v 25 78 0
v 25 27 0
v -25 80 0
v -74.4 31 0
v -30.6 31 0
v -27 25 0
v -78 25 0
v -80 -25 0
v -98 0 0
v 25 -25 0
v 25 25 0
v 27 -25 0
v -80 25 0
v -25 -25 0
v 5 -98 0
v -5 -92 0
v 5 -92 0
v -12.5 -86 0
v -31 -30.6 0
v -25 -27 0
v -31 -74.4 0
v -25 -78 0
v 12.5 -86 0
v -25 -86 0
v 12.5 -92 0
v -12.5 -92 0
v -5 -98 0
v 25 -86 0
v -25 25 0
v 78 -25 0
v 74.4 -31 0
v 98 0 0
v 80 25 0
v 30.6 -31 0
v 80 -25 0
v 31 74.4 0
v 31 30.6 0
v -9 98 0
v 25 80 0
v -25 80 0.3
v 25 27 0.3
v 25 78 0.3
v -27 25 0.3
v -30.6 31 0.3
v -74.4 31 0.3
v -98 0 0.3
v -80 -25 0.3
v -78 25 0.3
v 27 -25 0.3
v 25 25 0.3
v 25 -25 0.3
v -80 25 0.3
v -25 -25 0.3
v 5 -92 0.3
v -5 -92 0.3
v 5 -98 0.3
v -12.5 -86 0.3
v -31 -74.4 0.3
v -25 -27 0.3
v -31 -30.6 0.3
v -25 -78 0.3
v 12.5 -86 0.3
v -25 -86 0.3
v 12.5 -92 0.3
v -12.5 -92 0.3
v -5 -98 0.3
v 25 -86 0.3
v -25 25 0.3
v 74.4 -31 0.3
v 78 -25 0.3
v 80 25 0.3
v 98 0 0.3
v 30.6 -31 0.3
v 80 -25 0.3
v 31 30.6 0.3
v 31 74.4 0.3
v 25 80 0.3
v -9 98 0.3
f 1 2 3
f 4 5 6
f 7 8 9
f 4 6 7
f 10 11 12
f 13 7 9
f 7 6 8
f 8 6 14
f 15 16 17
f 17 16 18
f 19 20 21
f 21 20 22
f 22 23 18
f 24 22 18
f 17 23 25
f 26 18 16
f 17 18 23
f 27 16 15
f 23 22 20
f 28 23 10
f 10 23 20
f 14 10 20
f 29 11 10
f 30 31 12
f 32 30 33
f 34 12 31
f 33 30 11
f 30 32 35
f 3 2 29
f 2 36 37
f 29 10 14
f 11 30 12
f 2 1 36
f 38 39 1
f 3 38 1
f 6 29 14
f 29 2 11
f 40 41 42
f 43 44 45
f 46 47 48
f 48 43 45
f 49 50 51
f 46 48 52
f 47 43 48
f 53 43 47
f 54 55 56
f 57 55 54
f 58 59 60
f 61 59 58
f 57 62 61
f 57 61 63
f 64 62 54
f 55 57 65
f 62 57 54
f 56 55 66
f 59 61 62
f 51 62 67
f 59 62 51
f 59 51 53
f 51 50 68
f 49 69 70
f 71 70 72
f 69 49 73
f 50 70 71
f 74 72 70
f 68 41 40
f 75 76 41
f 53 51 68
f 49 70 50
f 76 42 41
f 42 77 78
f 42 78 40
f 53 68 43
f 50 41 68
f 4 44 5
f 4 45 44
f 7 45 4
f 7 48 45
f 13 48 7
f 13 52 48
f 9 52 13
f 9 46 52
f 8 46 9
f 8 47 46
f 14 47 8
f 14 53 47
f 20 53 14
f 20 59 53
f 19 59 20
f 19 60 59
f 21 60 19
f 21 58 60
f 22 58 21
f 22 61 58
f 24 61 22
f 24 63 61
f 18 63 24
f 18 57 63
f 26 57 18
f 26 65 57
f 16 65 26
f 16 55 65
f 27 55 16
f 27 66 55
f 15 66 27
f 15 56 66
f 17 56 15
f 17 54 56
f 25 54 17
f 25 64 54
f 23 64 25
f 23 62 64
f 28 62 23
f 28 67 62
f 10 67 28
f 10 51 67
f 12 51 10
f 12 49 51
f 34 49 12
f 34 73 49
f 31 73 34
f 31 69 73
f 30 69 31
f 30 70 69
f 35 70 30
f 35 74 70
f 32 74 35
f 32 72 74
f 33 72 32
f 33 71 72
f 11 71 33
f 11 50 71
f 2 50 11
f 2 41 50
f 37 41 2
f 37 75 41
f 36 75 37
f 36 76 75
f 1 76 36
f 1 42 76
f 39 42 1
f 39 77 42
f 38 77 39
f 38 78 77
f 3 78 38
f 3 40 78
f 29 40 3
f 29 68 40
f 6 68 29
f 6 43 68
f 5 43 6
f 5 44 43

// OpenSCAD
// Copyright (C) [Jonas Immanuel Frey] - Licensed under GPL

// One-piece paper lantern net. All dimensions are in millimetres.
// Roof shapes are upright silhouettes; the folded lantern is open on top.

// The walls are plain: windows and other decorations are SVG/DXF drawings the
// app (paper mode) places on them, see "App protocol" below.

/* [Output] */
output = "flat"; // [flat:Flat STL, cut:2D SVG or DXF, assembled:Folded preview, wall:Selected wall from outside, area:Decoration area]
// Guides appear only in the flat F5 preview, never in exported cutting geometry.
show_fold_guides = true;
paper_thickness = 0.3; // [0.1:0.05:1]

/* [House] */
// Square floor and width of each wall.
house_size = 50; // [30:1:90]
wall_height = 55; // [35:1:100]
roof_height = 18; // [0:1:40]
roof_style = "mixed"; // [mixed, gable, crooked, stepped, flat]

/* [Glue tabs] */
glue_tab_width = 6; // [3:0.5:12]
// Clearance at the floor and eaves so neighbouring folds do not bunch up.
tab_inset = 2; // [1:0.5:5]

/* [Hidden] */
// App protocol (vector2stl paper mode):
//   output = "cut"        the net as cut: the paper with every decoration cut out
//                         (inside face up, as it lies before folding)
//   output = "area"       where decorations may cut, laid out like the net; this
//                         output also echoes app_walls and app_folds
// app_walls[i] = [origin, x_axis, y_axis, [width, height]]: the point (x, y) of
//   wall i seen from outside lies on the net at origin + x * x_axis + y * y_axis.
// app_folds = [[[x0, y0], [x1, y1], angle], ...]: every fold line on the net and
//   how far it folds inward, in degrees. The app folds the cut net along these
//   lines for its 3D preview, starting from the piece under app_base.
// app_base = [x, y]: a point on the piece that stays put (the floor).
// Optional, with their defaults:
//   app_up = [0, 0, 1]: the direction on the app_base piece that points up
//     when folded; [0, 0, 1] stands a floor flat.
//   app_net_top = "inside": the face of the net facing up here becomes the
//     inside; "outside" for a net drawn outside face up (no mirroring needed).
//   app_fold_layer = true: the SVG gets a fold (score) layer; false when the cut
//     already perforates the folds.
// The app supplies normalized polygons, seen from outside:
//   app_decorations = [[wall, centre_x, centre_y, width, points, paths, rotation], ...]
decorations = is_undef(app_decorations) ? [] : app_decorations;
wall_index = 0;
minimum_border = 2;
tab_taper = glue_tab_width * 0.6;
guide_width = 0.25;
mixed_roofs = ["crooked", "gable", "stepped", "gable"];
flat_span = house_size + 2 * (wall_height + (roof_style == "flat" ? 0 : roof_height));

assert(output == "flat" || output == "cut" || output == "assembled" || output == "wall"
       || output == "area", "Choose flat, cut, assembled, wall or area output.");
assert(roof_style == "mixed" || roof_style == "gable" || roof_style == "crooked"
       || roof_style == "stepped" || roof_style == "flat", "Unknown roof style.");
assert(house_size > 0 && wall_height > 0 && roof_height >= 0 && paper_thickness > 0,
       "House size, wall height and thickness must be positive; roof height cannot be negative.");
assert(glue_tab_width > 0 && tab_inset > 0
       && wall_height > 2 * (tab_inset + tab_taper),
       "Tabs need positive width/inset and enough wall height for their tapered ends.");
assert(house_size > 2 * (glue_tab_width + minimum_border),
       "House walls need room for both corner glue areas and a cutout.");

echo(str("Floor: ", house_size, " x ", house_size,
         " mm; flat footprint: ", flat_span, " x ", flat_span, " mm."));

function wall_roof(index) = roof_style == "mixed" ? mixed_roofs[index] : roof_style;
function wall_top(index) =
    wall_roof(index) == "flat" || roof_height == 0 ? wall_height : wall_height + roof_height;

// Local wall coordinates: x = width, y = height above the floor fold.
module wall_outline_2d(style) {
    if (style == "flat" || roof_height == 0)
        square([house_size, wall_height]);
    else if (style == "stepped")
        polygon([
            [0, 0], [house_size, 0],
            [house_size, wall_height + roof_height / 3],
            [house_size * 0.75, wall_height + roof_height / 3],
            [house_size * 0.75, wall_height + roof_height * 2 / 3],
            [house_size * 0.6, wall_height + roof_height * 2 / 3],
            [house_size * 0.6, wall_height + roof_height],
            [house_size * 0.4, wall_height + roof_height],
            [house_size * 0.4, wall_height + roof_height * 2 / 3],
            [house_size * 0.25, wall_height + roof_height * 2 / 3],
            [house_size * 0.25, wall_height + roof_height / 3],
            [0, wall_height + roof_height / 3]
        ]);
    else
        polygon([
            [0, 0], [house_size, 0], [house_size, wall_height],
            [house_size * (style == "crooked" ? 0.32 : 0.5), wall_height + roof_height],
            [0, wall_height]
        ]);
}

// Where a wall may be cut: inside its perimeter border, clear of the floor fold
// and of the folded corner glue areas.
module decoration_area_2d(index) {
    intersection() {
        offset(delta = -minimum_border) wall_outline_2d(wall_roof(index));
        translate([glue_tab_width + minimum_border, minimum_border])
            square([house_size - 2 * (glue_tab_width + minimum_border),
                    wall_height + roof_height]);
    }
}

module wall_2d(index) {
    difference() {
        wall_outline_2d(wall_roof(index));
        intersection() {
            decoration_area_2d(index);
            union()
                for (decoration = decorations)
                    if (decoration[0] == index)
                        // The editor uses the outside view; the flat net faces inward.
                        // Rotation is in degrees clockwise as seen from outside.
                        translate([house_size - decoration[1], decoration[2]])
                            scale([-1, 1]) rotate(-decoration[6]) scale(decoration[3])
                                polygon(points = decoration[4], paths = decoration[5]);
        }
    }
}

// One tab on each wall's right edge; each corner receives exactly one tab.
module glue_tab_2d() {
    polygon([
        [house_size, tab_inset],
        [house_size + glue_tab_width, tab_inset + tab_taper],
        [house_size + glue_tab_width, wall_height - tab_inset - tab_taper],
        [house_size, wall_height - tab_inset]
    ]);
}

function rotate_2d(v, angle) =
    [v[0] * cos(angle) - v[1] * sin(angle), v[0] * sin(angle) + v[1] * cos(angle)];
// A point in wall `index`'s local (inside) coordinates, on the flat net.
function on_net(index, p) = rotate_2d([p[0] - house_size / 2, p[1] + house_size / 2], index * 90);
// Seen from outside, a wall's x runs the other way: x_outside = house_size - x_local.
function app_wall_frame(index) = [
    on_net(index, [house_size, 0]),
    on_net(index, [house_size - 1, 0]) - on_net(index, [house_size, 0]),
    on_net(index, [house_size, 1]) - on_net(index, [house_size, 0]),
    [house_size, wall_top(index)]
];
// The floor folds, then each glue tab's fold; walls stand up, tabs turn inward.
function fold_lines() = [
    for (index = [0:3]) each [
        [on_net(index, [0, 0]), on_net(index, [house_size, 0]), 90],
        [on_net(index, [house_size, tab_inset]), on_net(index, [house_size, wall_height - tab_inset]), 90]
    ]
];

module place_flat_wall(index) {
    rotate([0, 0, index * 90])
        translate([-house_size / 2, house_size / 2, 0]) children();
}

module net_2d() {
    union() {
        square([house_size, house_size], center = true);
        for (index = [0:3])
            place_flat_wall(index) {
                wall_2d(index);
                glue_tab_2d();
            }
    }
}

module fold_guides_2d() {
    for (line = fold_lines())
        hull() for (p = [line[0], line[1]]) translate(p) square(guide_width, center = true);
}

// Idealised folds for inspection; no allowance for paper bend radius.
module assembled() {
    color("#56364b")
        linear_extrude(paper_thickness)
            square([house_size, house_size], center = true);
    for (index = [0:3])
        rotate([0, 0, index * 90])
            translate([-house_size / 2, house_size / 2, paper_thickness / 2])
                rotate([90, 0, 0]) {
                    color(index % 2 == 0 ? "#56364b" : "#754d65")
                        linear_extrude(paper_thickness) wall_2d(index);
                    // Swing the right-hand tab inward against the next wall.
                    color("#b890a8")
                        translate([house_size - paper_thickness, 0, 0])
                            rotate([0, -90, 0])
                                linear_extrude(paper_thickness)
                                    translate([-house_size, 0]) glue_tab_2d();
                }
}

if (output == "cut") net_2d();
else if (output == "wall")
    translate([house_size, 0]) mirror([1, 0]) wall_2d(wall_index);
else if (output == "assembled") assembled();
else if (output == "area") {
    echo(app_walls = [for (index = [0:3]) app_wall_frame(index)]);
    echo(app_folds = fold_lines());
    echo(app_base = [0, 0]);
    echo(app_net_top = "inside");
    for (index = [0:3]) place_flat_wall(index) decoration_area_2d(index);
}
else {
    color("#56364b") linear_extrude(paper_thickness) net_2d();
    if ($preview && show_fold_guides)
        color("#ff9c38")
            translate([0, 0, paper_thickness + 0.01])
                linear_extrude(0.01) fold_guides_2d();
}
